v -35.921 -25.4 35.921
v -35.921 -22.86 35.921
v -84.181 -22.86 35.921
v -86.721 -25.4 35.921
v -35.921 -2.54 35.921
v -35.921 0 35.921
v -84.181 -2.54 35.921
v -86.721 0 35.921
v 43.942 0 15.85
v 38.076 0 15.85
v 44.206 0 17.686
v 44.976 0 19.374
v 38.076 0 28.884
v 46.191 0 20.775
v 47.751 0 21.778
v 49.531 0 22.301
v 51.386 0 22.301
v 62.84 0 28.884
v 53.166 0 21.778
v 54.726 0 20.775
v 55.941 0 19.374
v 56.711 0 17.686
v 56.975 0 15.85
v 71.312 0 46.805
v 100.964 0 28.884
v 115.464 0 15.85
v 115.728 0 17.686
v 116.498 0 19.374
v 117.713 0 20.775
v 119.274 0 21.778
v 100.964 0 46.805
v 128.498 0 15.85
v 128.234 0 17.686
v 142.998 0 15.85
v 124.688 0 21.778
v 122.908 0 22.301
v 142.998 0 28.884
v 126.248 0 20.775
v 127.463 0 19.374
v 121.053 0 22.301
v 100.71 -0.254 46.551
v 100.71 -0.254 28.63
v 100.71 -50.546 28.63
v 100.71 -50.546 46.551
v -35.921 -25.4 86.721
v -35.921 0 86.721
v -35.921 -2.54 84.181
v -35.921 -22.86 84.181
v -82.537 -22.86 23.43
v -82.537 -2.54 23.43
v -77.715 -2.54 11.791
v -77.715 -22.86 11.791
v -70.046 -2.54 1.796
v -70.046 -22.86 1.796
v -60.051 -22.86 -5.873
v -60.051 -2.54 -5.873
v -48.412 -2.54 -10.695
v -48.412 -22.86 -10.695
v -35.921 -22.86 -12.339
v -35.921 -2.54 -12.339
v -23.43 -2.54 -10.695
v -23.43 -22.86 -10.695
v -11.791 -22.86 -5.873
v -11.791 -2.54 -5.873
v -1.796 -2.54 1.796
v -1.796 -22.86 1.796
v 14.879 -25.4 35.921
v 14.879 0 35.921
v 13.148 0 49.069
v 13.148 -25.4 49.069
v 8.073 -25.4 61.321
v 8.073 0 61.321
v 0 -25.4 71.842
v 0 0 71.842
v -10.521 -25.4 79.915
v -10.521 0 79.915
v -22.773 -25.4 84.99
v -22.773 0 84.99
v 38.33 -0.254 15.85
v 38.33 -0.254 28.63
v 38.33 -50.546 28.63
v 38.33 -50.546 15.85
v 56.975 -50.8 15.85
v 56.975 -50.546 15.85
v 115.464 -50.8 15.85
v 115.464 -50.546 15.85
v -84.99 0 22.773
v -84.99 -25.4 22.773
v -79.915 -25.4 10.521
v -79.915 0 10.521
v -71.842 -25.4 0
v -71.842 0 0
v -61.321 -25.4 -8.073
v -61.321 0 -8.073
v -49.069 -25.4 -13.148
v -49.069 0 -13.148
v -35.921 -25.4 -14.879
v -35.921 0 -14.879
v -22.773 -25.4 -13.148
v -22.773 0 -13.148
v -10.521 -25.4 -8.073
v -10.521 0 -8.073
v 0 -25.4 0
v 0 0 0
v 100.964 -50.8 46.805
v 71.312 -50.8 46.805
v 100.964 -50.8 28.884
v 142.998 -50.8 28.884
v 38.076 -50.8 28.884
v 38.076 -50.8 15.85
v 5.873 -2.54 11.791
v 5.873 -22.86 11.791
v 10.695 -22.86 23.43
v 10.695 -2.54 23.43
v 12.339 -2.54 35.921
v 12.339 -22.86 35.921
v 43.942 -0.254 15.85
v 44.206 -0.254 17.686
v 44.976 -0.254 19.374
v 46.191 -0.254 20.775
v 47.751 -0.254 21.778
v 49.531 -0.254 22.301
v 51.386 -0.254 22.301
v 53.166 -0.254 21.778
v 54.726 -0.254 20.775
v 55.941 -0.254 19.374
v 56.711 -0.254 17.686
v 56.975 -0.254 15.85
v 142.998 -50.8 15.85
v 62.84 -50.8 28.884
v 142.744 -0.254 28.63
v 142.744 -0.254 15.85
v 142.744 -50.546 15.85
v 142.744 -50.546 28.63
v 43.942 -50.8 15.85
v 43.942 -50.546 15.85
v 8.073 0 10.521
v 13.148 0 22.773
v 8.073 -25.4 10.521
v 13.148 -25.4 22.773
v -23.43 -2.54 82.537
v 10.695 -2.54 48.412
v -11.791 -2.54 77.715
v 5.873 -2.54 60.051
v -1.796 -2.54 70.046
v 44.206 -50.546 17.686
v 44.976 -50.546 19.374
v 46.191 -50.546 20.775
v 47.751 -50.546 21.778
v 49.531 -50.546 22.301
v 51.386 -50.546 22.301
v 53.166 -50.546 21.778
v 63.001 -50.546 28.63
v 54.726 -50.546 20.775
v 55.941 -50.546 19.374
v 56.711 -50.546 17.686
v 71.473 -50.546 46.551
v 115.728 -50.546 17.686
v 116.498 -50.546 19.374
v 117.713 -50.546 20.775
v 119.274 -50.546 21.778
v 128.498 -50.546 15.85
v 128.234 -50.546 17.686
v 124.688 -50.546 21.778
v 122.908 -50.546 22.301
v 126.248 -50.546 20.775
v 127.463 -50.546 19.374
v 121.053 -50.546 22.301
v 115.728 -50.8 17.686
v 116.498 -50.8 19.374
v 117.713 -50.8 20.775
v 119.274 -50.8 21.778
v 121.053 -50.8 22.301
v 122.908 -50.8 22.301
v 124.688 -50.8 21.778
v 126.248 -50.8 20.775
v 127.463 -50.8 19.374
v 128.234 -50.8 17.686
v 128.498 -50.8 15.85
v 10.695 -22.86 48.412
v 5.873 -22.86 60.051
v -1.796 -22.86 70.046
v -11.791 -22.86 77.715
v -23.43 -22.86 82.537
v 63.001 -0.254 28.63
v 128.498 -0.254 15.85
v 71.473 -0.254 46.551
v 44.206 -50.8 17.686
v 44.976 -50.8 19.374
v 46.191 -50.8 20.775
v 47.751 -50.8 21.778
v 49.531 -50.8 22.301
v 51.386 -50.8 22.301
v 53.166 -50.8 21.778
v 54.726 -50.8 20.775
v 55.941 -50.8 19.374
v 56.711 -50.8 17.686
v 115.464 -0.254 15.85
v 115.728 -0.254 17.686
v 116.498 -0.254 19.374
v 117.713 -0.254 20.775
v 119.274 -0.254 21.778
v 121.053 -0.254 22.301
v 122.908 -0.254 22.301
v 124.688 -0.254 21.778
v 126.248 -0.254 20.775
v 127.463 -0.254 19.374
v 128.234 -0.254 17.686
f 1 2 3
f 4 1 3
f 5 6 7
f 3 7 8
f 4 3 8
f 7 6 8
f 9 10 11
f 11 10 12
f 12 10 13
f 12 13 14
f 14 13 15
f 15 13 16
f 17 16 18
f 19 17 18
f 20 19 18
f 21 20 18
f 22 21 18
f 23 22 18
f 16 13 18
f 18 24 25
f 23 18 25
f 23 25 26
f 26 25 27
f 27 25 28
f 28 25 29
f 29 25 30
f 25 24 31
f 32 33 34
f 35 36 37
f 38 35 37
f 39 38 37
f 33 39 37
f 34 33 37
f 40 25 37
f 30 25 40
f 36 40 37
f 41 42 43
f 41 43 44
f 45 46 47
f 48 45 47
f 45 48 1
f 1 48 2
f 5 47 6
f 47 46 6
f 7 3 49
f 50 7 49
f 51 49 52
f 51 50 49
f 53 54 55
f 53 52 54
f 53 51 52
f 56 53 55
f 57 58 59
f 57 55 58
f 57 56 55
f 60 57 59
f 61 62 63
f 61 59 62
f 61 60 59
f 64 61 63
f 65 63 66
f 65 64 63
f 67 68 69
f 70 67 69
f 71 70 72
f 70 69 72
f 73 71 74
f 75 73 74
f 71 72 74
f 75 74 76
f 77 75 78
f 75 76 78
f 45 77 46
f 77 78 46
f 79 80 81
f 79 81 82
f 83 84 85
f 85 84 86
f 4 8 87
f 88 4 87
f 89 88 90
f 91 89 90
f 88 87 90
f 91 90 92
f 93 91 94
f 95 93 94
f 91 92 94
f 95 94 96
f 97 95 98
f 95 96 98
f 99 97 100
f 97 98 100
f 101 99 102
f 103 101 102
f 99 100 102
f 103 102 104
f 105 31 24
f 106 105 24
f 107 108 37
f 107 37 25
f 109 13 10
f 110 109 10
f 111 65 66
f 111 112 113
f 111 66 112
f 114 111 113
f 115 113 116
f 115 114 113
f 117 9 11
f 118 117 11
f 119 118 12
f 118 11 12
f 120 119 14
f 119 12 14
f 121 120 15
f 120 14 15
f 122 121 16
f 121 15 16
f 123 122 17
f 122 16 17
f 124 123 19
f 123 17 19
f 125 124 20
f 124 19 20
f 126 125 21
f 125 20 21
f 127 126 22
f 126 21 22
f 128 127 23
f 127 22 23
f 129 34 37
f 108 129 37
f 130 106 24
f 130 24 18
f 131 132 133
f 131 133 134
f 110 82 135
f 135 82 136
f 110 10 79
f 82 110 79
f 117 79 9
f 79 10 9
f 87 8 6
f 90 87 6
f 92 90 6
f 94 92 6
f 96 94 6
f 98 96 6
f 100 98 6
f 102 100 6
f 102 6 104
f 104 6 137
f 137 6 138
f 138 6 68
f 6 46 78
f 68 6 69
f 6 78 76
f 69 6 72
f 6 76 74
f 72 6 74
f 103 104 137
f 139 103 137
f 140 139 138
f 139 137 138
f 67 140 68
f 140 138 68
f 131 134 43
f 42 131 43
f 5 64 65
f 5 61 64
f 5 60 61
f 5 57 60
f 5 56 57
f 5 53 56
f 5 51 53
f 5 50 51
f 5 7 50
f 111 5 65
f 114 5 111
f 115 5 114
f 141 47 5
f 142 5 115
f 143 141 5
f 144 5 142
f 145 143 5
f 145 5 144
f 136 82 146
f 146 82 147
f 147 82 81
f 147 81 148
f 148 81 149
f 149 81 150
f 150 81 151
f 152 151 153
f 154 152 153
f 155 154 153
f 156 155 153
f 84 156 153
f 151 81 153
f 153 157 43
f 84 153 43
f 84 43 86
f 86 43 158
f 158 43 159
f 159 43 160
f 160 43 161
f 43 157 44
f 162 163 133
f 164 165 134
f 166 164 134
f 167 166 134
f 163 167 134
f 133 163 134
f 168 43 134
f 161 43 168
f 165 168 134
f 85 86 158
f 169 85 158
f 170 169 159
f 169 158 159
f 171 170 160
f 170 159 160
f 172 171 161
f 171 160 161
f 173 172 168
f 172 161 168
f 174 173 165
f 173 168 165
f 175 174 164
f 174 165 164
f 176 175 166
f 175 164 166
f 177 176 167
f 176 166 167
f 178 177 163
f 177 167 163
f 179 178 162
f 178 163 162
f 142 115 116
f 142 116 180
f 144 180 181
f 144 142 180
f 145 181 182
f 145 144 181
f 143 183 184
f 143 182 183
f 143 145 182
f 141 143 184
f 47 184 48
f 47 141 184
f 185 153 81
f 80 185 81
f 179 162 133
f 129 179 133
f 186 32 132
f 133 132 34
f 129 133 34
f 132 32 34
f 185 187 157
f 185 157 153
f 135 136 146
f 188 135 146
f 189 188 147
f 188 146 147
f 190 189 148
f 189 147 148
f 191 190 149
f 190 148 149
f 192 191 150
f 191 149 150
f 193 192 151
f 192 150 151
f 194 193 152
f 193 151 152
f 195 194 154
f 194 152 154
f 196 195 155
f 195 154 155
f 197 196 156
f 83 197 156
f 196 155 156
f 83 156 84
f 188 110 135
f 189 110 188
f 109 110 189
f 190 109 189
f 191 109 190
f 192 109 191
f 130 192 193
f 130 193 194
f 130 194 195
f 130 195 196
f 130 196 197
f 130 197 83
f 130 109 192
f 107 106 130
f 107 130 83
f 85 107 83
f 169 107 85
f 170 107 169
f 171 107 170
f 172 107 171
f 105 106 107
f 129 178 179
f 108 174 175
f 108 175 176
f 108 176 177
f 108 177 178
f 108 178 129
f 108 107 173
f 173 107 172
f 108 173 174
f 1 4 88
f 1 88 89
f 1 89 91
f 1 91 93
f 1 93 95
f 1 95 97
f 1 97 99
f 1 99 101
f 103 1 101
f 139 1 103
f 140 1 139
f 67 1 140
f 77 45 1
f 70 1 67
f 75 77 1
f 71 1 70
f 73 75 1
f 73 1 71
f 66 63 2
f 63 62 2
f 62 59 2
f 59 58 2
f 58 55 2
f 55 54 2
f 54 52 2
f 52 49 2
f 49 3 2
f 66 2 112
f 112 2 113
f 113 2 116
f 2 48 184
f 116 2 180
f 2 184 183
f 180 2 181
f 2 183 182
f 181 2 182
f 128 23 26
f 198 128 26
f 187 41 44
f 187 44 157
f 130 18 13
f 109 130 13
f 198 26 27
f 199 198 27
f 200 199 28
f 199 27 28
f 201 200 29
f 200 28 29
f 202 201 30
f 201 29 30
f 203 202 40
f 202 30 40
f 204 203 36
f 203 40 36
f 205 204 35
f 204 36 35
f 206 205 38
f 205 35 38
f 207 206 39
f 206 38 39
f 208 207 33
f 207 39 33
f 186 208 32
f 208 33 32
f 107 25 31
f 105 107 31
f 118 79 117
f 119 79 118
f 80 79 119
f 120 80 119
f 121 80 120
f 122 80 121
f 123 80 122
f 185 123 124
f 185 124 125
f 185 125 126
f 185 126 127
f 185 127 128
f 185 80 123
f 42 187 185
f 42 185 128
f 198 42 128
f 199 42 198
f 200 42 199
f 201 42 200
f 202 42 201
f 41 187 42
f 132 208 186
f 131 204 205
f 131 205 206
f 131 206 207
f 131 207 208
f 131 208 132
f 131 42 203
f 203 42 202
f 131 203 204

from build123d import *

# Parameters (mm, degrees)
F1_DEPTH = 25.4
F2_T     = -2.54
F4_DEPTH = 25.4
F6_DEPTH = 50.8
F7_T     = -0.254


with BuildPart() as f1:
    # F0 (on Front) → F1 (new body)
    with BuildSketch(Plane.XZ):
        with BuildLine():
            ThreePointArc((0, 0), (11.0120557673, 16.4807061201), (14.8789755157, 35.9210244843))
            ThreePointArc((14.8789755157, 35.9210244843), (-82.8541047359, 55.3613428484), (0, 0))
        make_face()
    extrude(amount=F1_DEPTH)

    # F2 (hollow: no face is removed)
    offset(amount=F2_T, mode=Mode.SUBTRACT)

    # F3 (on face) → F4 (cut)
    with BuildSketch(Plane(origin=(0, 0, 0), x_dir=(-1, 0, 0), z_dir=(0, 1, 0))):
        with BuildLine():
            Line((35.9210244843, 86.7210244843), (35.9210244843, 35.9210244843))
            Line((35.9210244843, 35.9210244843), (86.7210244843, 35.9210244843))
            ThreePointArc((86.7210244843, 35.9210244843), (71.8420489686, 71.8420489686), (35.9210244843, 86.7210244843))
        make_face()
    extrude(amount=-F4_DEPTH, mode=Mode.SUBTRACT)


with BuildPart() as f6:
    # F5 (on Front) → F6 (new body)
    with BuildSketch(Plane.XZ):
        with BuildLine():
            Line((142.9976224899, 15.8503782004), (142.9976224899, 28.8840625435))
            Line((142.9976224899, 28.8840625435), (100.9640023112, 28.8840625435))
            Line((100.9640023112, 28.8840625435), (100.9640023112, 46.8053743243))
            Line((100.9640023112, 46.8053743243), (71.3123679161, 46.8053743243))
            Line((71.3123679161, 46.8053743243), (62.8404766321, 28.8840625435))
            Line((62.8404766321, 28.8840625435), (38.0764789879, 28.8840625435))
            Line((38.0764789879, 28.8840625435), (38.0764789879, 15.8503782004))
            Line((38.0764789879, 15.8503782004), (43.9416356385, 15.8503782004))
            ThreePointArc((43.9416356385, 15.8503782004), (50.45847781, 22.367220372), (56.9753199816, 15.8503782004))
            Line((56.9753199816, 15.8503782004), (62.8404766321, 15.8503782004))
            Line((62.8404766321, 15.8503782004), (100.9640023112, 15.8503782004))
            Line((100.9640023112, 15.8503782004), (115.463970229, 15.8503782004))
            ThreePointArc((115.463970229, 15.8503782004), (121.9808124006, 22.367220372), (128.4976545721, 15.8503782004))
            Line((128.4976545721, 15.8503782004), (142.9976224899, 15.8503782004))
        make_face()
    extrude(amount=F6_DEPTH)

    # F7
    f7_openings = [f6.faces().sort_by_distance(p)[0] for p in [
        (86.219645, -25.4, 15.850378),
        (135.747639, -25.4, 15.850378),
        (121.980812, -25.4, 22.36722),
        (50.458478, -25.4, 22.36722),
        (41.009057, -25.4, 15.850378),
    ]]
    offset(amount=F7_T, openings=f7_openings, kind=Kind.INTERSECTION)


solid = Compound([f1.part, f6.part])
